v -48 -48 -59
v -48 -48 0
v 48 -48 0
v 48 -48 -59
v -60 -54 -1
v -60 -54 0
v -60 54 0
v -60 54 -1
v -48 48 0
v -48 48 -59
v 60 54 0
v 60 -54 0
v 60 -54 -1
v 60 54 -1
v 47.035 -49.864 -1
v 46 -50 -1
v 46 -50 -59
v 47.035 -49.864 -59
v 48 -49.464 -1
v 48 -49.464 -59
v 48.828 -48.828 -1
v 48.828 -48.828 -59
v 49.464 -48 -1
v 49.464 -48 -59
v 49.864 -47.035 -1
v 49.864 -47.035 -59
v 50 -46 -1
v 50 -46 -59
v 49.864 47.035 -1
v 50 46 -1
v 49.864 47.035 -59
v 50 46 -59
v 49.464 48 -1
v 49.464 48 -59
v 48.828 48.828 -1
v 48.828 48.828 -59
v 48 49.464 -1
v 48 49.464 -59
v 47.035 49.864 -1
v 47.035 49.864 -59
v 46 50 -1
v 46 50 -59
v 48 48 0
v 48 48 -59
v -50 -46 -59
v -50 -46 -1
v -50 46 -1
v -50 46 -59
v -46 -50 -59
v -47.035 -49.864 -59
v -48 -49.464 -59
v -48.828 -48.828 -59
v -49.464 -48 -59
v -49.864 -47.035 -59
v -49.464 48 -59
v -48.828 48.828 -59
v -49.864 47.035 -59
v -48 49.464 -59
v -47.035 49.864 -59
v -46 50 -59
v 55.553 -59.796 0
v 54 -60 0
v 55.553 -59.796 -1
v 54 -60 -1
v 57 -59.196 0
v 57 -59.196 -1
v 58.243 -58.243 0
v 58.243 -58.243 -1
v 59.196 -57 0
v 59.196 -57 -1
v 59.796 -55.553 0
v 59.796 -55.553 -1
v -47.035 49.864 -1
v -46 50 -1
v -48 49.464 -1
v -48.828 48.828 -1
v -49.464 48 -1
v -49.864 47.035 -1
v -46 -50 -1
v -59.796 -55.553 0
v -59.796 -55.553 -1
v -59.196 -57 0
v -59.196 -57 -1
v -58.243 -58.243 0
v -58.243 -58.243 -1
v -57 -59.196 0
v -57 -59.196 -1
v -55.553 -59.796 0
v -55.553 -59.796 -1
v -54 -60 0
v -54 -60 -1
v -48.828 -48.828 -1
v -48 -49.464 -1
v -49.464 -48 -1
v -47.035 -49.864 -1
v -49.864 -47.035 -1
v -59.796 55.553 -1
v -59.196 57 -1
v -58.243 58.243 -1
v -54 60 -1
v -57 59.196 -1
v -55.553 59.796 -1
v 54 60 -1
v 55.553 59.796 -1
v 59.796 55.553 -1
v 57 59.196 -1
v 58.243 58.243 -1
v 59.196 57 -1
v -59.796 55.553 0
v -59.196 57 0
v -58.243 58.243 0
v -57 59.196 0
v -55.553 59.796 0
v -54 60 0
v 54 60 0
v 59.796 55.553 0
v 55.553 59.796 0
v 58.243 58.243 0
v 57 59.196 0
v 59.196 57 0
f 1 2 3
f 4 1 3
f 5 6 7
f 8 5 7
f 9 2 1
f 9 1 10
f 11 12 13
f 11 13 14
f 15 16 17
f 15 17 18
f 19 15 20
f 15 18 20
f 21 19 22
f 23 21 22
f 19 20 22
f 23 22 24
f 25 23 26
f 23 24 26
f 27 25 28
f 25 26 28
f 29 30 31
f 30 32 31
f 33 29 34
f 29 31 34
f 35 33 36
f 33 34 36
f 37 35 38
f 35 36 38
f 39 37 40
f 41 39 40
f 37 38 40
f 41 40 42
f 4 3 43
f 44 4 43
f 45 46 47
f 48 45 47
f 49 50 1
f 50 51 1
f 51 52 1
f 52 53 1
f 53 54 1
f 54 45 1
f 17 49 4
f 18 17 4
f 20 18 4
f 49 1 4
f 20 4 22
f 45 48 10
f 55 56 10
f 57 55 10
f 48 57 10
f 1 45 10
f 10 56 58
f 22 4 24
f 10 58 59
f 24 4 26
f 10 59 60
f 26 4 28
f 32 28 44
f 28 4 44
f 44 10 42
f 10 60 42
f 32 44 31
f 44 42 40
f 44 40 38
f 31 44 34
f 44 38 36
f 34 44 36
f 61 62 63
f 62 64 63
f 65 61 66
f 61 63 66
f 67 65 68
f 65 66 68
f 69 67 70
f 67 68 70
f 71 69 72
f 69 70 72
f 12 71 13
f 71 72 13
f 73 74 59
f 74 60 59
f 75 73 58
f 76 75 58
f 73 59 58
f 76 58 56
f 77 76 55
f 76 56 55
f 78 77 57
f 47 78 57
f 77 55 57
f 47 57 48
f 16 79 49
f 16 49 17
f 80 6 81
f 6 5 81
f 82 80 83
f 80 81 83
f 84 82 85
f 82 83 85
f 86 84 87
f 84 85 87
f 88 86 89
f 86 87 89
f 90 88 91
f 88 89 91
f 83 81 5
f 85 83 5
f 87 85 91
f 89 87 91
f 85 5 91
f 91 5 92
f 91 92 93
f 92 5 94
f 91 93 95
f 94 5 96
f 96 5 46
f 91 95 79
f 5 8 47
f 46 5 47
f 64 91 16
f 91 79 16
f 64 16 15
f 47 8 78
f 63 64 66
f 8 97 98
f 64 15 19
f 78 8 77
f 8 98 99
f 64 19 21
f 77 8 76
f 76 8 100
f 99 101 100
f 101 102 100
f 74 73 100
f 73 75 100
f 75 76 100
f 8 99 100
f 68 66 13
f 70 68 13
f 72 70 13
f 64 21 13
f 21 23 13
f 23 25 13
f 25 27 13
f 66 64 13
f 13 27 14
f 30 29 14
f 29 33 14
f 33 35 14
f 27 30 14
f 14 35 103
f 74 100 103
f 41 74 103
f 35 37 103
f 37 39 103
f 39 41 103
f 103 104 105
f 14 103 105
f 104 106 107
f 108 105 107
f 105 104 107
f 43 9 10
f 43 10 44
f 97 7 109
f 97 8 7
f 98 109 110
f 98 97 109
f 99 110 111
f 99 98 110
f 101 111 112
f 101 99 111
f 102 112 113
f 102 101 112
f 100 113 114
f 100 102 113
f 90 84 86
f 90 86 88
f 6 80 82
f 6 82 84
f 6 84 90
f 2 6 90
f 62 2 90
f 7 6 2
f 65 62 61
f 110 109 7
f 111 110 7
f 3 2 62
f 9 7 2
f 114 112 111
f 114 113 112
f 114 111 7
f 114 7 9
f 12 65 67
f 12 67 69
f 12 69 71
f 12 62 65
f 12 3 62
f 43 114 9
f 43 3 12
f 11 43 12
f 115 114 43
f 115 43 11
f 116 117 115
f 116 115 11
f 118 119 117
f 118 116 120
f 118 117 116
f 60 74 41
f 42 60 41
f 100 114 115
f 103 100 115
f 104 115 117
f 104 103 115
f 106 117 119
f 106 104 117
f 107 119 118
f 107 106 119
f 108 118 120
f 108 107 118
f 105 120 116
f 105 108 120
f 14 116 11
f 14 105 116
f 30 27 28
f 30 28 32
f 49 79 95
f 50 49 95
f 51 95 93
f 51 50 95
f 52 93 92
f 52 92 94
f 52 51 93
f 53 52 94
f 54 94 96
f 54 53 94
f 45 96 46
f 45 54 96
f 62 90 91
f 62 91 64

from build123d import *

# Parameters (mm, degrees)
SKETCH1_W           = 100
SKETCH1_H           = 100
SKETCH1_W_2         = 96
SKETCH1_H_2         = 96
BOSS_EXTRUDE1_DEPTH = 59
SKETCH2_W           = 120
SKETCH2_H           = 120
SKETCH2_W_2         = 100
SKETCH2_H_2         = 100
BOSS_EXTRUDE4_DEPTH = 1
FILLET1_R           = 4
FILLET2_R           = 6


with BuildPart() as part:
    # Sketch1 → Boss-Extrude1 (new body)
    with BuildSketch(Plane.XY):
        Rectangle(SKETCH1_W, SKETCH1_H)
        Rectangle(SKETCH1_W_2, SKETCH1_H_2, mode=Mode.SUBTRACT)
    extrude(amount=-BOSS_EXTRUDE1_DEPTH)

    # Sketch2 → Boss-Extrude4 (add)
    with BuildSketch(Plane.XY):
        Rectangle(SKETCH2_W, SKETCH2_H)
        Rectangle(SKETCH2_W_2, SKETCH2_H_2, mode=Mode.SUBTRACT)
    extrude(amount=-BOSS_EXTRUDE4_DEPTH)

    # Fillet1
    fillet1_edges = [part.edges().sort_by_distance(p)[0] for p in [
        (-50, -50, -30),
        (-50, 50, -30),
        (50, 50, -30),
        (50, -50, -30),
    ]]
    fillet(fillet1_edges, radius=FILLET1_R)

    # Fillet2
    fillet2_edges = [part.edges().sort_by_distance(p)[0] for p in [
        (60, -60, -0.5),
        (-60, -60, -0.5),
        (-60, 60, -0.5),
        (60, 60, -0.5),
    ]]
    fillet(fillet2_edges, radius=FILLET2_R)


solid = part.part
